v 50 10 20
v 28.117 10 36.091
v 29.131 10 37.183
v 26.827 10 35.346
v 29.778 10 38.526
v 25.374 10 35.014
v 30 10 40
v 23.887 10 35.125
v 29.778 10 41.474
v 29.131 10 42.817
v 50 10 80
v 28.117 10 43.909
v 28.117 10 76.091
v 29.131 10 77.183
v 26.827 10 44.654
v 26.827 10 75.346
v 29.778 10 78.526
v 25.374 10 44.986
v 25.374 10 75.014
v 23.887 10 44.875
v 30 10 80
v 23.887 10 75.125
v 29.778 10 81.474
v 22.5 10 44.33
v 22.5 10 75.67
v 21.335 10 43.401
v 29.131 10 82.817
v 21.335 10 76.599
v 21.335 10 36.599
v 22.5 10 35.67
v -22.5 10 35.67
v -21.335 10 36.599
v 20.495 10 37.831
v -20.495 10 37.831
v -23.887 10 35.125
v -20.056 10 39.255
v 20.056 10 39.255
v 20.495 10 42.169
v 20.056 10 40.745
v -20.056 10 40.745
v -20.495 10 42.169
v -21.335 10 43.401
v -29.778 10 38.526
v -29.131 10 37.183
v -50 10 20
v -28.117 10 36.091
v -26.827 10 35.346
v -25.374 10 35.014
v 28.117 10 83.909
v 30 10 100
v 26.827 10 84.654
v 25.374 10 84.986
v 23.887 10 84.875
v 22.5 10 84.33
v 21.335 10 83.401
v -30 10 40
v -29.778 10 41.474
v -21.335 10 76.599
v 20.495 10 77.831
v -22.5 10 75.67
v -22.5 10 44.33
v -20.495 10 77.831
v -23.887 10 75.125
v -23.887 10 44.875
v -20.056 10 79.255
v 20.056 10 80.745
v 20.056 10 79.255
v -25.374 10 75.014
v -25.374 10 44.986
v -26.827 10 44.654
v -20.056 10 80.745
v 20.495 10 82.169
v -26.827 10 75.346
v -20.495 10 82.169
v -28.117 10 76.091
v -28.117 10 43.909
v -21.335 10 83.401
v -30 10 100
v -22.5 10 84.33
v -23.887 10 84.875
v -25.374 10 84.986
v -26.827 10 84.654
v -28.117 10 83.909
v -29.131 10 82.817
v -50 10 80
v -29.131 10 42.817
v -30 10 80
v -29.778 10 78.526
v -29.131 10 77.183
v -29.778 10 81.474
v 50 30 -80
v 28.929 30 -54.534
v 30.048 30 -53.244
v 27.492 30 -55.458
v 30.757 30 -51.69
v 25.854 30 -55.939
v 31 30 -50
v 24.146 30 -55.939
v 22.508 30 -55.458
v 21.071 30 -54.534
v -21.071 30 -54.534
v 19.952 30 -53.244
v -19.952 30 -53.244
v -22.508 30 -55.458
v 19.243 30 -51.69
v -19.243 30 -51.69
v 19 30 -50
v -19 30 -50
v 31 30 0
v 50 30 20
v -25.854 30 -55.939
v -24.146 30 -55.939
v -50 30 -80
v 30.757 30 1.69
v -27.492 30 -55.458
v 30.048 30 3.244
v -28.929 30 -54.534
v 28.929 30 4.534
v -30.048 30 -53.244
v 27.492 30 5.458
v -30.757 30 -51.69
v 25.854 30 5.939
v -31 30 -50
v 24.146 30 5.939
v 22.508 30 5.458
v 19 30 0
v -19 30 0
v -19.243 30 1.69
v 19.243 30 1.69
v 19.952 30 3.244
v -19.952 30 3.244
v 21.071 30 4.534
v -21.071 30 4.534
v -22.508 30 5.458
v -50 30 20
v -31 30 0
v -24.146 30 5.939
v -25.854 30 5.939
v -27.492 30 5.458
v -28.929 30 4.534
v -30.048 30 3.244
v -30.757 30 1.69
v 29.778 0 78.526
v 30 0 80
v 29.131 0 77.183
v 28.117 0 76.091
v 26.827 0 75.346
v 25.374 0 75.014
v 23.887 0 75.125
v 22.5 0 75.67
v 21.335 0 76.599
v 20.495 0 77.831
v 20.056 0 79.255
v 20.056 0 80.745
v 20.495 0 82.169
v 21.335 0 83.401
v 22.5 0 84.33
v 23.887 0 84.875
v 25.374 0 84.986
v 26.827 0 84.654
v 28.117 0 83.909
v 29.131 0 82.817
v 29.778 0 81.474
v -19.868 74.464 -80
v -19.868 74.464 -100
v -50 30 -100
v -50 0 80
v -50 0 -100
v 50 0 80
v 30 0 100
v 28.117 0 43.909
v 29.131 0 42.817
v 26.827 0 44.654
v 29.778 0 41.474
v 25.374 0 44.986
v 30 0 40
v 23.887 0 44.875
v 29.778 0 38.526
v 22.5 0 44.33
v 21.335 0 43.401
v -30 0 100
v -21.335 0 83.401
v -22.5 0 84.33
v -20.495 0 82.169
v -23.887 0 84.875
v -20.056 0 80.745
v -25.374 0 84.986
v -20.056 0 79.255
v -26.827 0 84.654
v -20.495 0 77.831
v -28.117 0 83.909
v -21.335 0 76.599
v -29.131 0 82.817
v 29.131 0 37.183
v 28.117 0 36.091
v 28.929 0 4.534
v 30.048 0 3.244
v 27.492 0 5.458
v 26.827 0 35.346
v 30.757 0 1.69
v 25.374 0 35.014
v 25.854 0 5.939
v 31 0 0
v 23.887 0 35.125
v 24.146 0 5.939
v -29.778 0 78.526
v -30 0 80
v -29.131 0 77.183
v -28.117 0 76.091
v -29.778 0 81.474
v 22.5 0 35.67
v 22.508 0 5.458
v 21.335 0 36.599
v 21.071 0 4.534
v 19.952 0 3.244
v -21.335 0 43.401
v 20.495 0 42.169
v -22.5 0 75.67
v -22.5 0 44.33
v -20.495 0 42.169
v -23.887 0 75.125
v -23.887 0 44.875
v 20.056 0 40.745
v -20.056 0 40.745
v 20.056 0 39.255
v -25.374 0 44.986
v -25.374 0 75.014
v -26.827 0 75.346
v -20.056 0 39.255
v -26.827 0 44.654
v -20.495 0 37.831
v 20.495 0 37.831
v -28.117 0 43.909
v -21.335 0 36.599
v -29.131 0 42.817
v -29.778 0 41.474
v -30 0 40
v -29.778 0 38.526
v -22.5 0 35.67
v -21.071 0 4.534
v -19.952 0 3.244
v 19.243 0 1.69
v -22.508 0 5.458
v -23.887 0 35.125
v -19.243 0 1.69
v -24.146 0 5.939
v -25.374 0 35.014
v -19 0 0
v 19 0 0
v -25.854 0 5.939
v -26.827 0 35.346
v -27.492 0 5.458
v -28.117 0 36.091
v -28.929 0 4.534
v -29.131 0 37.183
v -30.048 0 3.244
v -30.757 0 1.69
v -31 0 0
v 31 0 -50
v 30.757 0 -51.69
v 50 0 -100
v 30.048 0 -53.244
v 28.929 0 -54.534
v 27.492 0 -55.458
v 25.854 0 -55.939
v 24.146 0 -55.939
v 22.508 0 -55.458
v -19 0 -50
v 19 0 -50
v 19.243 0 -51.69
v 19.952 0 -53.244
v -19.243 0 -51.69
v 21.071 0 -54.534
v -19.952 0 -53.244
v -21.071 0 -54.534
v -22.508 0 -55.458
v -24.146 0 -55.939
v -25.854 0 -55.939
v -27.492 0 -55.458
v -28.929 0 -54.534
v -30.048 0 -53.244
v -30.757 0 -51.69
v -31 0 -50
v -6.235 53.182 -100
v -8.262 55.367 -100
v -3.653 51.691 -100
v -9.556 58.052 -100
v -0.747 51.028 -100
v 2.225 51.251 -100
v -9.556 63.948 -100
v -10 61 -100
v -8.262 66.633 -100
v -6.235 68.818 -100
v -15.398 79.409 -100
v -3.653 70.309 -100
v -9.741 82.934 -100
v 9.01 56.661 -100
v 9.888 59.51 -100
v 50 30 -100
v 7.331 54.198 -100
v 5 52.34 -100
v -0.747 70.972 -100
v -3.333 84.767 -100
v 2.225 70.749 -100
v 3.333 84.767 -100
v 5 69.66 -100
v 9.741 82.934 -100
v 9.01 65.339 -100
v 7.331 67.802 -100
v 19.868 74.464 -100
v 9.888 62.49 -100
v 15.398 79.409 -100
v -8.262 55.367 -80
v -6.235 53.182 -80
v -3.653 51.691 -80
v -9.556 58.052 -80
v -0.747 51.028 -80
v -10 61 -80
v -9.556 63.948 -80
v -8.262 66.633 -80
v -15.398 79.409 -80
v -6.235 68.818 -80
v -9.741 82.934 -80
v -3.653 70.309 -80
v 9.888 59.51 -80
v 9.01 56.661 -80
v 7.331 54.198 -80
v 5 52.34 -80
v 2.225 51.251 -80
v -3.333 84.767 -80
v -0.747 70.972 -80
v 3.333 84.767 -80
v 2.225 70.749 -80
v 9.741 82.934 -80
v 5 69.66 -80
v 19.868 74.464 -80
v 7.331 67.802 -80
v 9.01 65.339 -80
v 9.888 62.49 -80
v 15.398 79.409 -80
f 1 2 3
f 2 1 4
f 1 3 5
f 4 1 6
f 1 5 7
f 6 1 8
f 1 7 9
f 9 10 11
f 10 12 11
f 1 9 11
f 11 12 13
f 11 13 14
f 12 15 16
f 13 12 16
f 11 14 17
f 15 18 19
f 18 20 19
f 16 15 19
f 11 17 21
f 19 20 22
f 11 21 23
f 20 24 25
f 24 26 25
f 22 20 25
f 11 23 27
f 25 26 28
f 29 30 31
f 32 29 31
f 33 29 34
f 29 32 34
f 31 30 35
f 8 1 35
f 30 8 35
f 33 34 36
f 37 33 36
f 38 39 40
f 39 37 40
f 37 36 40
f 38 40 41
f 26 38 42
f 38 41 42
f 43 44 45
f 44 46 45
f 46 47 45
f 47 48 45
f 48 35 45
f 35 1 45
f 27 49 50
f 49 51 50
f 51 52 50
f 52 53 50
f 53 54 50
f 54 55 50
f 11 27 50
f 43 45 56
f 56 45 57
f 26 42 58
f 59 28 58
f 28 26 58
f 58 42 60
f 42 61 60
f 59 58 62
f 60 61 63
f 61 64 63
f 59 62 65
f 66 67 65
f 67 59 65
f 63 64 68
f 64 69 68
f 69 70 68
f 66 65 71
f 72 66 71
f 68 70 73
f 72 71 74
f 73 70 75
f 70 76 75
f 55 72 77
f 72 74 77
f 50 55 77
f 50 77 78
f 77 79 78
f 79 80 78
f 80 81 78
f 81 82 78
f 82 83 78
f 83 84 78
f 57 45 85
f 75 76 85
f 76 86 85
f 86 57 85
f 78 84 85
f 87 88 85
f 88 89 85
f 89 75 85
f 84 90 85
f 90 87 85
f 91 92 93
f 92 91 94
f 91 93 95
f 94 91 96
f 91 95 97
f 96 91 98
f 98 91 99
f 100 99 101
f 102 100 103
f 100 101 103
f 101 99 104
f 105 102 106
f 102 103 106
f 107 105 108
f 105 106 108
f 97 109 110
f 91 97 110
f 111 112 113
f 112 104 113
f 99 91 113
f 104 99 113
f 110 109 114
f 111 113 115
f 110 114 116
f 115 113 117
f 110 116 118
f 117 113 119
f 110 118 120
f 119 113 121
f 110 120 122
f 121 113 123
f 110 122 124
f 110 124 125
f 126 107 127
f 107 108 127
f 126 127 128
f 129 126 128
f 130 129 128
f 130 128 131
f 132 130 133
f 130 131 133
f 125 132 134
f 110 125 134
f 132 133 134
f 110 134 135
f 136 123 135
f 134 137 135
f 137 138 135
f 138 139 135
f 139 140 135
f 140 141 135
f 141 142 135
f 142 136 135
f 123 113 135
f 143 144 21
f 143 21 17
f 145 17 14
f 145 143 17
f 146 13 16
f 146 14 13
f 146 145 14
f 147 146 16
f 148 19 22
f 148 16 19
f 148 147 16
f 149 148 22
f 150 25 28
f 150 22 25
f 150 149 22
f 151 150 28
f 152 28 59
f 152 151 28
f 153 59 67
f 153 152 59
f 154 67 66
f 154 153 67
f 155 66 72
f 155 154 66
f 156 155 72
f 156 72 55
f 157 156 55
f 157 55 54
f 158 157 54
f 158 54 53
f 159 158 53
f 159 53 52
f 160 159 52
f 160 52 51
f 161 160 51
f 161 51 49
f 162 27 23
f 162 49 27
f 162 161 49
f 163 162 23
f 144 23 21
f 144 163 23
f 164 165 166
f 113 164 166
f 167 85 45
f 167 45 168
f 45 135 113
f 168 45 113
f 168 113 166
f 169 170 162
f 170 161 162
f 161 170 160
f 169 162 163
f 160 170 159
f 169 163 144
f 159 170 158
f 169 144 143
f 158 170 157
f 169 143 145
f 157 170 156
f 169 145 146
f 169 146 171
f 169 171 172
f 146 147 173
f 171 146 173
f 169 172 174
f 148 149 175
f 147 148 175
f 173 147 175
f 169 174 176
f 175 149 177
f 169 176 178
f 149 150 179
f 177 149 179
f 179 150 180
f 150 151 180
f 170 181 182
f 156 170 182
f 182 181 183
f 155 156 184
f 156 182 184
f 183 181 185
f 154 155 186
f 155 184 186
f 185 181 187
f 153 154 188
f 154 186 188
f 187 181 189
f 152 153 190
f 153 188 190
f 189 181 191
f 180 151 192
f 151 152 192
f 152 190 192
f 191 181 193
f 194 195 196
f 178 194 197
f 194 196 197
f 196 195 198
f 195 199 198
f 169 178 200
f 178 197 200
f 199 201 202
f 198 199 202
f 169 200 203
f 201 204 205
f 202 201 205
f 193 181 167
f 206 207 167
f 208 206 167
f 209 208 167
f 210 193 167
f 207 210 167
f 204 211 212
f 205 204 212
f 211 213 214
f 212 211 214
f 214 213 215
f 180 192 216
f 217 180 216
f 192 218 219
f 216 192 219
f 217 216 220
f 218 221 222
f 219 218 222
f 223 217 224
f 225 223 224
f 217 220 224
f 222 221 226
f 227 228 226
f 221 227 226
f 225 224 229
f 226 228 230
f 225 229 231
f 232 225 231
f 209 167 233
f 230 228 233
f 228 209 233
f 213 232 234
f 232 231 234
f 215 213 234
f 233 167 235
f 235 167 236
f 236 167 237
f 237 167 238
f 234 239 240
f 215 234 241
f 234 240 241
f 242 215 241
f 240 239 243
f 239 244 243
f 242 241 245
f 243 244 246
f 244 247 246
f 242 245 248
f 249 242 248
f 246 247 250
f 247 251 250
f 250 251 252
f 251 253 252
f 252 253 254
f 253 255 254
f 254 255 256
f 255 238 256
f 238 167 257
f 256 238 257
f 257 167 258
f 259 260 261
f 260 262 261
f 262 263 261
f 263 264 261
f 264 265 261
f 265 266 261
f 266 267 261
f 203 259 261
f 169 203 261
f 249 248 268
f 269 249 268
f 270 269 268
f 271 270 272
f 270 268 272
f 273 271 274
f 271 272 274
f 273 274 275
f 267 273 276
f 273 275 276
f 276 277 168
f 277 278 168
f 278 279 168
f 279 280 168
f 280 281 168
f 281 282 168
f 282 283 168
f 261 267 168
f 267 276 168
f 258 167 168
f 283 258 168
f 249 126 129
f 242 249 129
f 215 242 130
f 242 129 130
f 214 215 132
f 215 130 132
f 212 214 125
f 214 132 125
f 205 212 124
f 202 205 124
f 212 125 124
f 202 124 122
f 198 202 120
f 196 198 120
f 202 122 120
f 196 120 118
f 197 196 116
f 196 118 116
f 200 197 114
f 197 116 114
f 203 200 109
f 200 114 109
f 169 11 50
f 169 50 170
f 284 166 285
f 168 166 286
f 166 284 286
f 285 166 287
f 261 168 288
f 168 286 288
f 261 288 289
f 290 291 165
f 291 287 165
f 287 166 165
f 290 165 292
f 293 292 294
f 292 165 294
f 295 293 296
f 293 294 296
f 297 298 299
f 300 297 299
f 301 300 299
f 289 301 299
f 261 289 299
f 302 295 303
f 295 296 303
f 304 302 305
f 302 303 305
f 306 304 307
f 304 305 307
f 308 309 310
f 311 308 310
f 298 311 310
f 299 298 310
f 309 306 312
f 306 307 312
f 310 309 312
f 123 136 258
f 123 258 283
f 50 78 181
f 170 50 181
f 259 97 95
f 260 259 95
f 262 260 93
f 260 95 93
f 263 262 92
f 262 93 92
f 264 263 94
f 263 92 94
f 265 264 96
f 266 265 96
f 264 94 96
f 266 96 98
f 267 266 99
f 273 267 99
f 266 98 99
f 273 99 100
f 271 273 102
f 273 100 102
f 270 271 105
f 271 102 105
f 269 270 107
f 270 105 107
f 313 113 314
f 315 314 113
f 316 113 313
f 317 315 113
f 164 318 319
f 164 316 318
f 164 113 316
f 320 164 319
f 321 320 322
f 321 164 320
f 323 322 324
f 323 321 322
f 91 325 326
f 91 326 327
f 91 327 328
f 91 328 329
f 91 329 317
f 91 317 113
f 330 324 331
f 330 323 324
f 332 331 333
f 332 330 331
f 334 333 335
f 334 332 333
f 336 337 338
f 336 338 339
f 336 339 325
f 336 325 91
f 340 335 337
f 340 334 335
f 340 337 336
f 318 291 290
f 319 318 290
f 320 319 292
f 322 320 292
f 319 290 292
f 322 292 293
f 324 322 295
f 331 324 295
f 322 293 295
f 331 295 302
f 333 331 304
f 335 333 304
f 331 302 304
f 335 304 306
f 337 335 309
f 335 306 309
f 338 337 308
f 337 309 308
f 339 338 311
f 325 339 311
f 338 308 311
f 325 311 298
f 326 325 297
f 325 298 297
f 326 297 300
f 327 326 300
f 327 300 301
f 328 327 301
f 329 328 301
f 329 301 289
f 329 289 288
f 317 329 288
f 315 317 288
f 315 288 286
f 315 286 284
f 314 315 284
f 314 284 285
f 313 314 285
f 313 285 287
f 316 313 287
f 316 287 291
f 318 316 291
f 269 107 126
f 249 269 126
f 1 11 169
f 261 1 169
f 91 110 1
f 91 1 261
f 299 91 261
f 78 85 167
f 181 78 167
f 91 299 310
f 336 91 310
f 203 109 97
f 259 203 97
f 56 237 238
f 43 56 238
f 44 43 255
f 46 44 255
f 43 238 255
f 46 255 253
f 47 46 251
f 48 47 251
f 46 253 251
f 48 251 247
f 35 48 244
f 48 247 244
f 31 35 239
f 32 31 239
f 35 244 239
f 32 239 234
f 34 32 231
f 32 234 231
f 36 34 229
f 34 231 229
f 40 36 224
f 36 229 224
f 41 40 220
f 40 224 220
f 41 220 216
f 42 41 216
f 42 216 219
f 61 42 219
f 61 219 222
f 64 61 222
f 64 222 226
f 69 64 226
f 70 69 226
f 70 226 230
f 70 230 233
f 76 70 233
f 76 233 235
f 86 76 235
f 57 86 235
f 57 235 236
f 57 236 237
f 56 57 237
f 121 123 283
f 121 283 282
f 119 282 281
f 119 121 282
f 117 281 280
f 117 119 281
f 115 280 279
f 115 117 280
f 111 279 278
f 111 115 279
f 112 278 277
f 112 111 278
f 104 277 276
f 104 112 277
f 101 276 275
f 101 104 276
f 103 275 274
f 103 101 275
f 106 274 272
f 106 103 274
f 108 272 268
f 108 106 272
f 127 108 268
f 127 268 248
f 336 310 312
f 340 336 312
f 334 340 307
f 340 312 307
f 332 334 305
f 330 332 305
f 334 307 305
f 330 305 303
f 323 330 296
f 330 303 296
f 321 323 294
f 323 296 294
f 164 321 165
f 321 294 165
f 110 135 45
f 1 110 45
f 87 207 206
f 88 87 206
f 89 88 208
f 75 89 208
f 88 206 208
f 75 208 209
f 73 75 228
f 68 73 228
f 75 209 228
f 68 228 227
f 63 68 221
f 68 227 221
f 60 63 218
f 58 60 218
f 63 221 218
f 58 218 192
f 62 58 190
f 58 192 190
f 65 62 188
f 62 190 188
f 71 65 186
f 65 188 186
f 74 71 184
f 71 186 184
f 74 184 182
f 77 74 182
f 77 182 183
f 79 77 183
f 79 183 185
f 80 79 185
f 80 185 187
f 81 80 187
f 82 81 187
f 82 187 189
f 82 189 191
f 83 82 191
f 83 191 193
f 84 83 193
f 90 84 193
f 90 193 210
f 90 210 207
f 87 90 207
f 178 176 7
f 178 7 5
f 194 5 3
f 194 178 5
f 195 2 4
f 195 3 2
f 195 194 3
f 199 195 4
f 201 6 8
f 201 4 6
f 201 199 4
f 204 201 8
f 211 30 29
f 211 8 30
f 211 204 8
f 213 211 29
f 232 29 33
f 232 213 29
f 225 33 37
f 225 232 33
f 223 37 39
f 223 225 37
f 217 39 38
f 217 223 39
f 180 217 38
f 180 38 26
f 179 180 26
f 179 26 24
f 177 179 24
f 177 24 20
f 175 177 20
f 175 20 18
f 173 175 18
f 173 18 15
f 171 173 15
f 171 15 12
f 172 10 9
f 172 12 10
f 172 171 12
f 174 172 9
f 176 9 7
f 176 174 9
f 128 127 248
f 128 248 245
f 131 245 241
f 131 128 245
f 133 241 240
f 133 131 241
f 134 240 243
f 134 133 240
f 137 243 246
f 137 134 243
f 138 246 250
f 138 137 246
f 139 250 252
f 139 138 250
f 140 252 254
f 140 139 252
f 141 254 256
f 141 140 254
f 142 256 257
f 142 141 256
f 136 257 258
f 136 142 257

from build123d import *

# Parameters (mm, degrees)
BOSS_EXTRUDE1_DEPTH      = 50
BOSS_EXTRUDE1_DEPTH_BACK = 50
CHAMFER1_SIZE            = 20
HOLE1_D                  = 10
CUT_EXTRUDE1_DEPTH       = 125.599357944
SKETCH7_W                = 100
SKETCH7_H                = 55
CUT_EXTRUDE2_DEPTH       = 206.243757518
BOSS_EXTRUDE2_DEPTH      = 20
HOLE2_D                  = 20


with BuildPart() as part:
    # Sketch1 → Boss-Extrude1 (new, two sides: drawn at the far end of the back side and taken through both)
    with BuildSketch(Plane(origin=(0, 0, 0), x_dir=(0, 0, -1), z_dir=(1, 0, 0)).offset(-BOSS_EXTRUDE1_DEPTH_BACK)):
        Polygon((-100, 0), (100, 0), (100, 85), (80, 85), (80, 30), (-20, 30), (-20, 10), (-100, 10), align=None)
    extrude(amount=BOSS_EXTRUDE1_DEPTH + BOSS_EXTRUDE1_DEPTH_BACK)

    # Chamfer1
    chamfer1_edges = [part.edges().sort_by_distance(p)[0] for p in [
        (50, 5, 100),
        (-50, 5, 100),
    ]]
    chamfer(chamfer1_edges, length=CHAMFER1_SIZE)

    # Hole1 (through all)
    with Locations(Plane(origin=(0, 10, 0), x_dir=(1, 0, 0), z_dir=(0, 1, 0))):
        with Locations((-25, -40), (-25, -80)):
            hole1 = Hole(HOLE1_D / 2)

    # Mirror1: Hole1 across plane
    add(hole1.mirror(Plane(origin=(0, 0, 0), x_dir=(0, 0, 1), z_dir=(1, 0, 0))), mode=Mode.SUBTRACT)

    # Sketch4 → Cut-Extrude1 (cut, through all)
    with BuildSketch(Plane(origin=(0, 30, 0), x_dir=(1, 0, 0), z_dir=(0, 1, 0))):
        with BuildLine():
            Line((-19, 50), (-19, 0))
            ThreePointArc((-19, 0), (-25, -6), (-31, 0))
            Line((-31, 0), (-31, 50))
            ThreePointArc((-31, 50), (-25, 56), (-19, 50))
        make_face()
        with BuildLine():
            Line((19, 50), (19, 0))
            ThreePointArc((19, 0), (25, -6), (31, 0))
            Line((31, 0), (31, 50))
            ThreePointArc((31, 50), (25, 56), (19, 50))
        make_face()
    extrude(amount=-CUT_EXTRUDE1_DEPTH, mode=Mode.SUBTRACT)

    # Sketch7 → Cut-Extrude2 (cut, through all)
    with BuildSketch(Plane.XY.offset(-80)):
        with Locations((0, 57.5)):
            Rectangle(SKETCH7_W, SKETCH7_H)
    extrude(amount=-CUT_EXTRUDE2_DEPTH, mode=Mode.SUBTRACT)

    # Sketch8 → Boss-Extrude2 (add)
    with BuildSketch(Plane(origin=(0, 0, -100), x_dir=(-1, 0, 0), z_dir=(0, 0, -1))):
        with BuildLine():
            Line((50, 30), (-50, 30))
            Line((-50, 30), (-19.867631849, 74.463922337))
            ThreePointArc((-19.867631849, 74.463922337), (0, 85), (19.867631849, 74.463922337))
            Line((19.867631849, 74.463922337), (50, 30))
        make_face()
    extrude(amount=-BOSS_EXTRUDE2_DEPTH)

    # Hole2 (through all)
    with Locations(Plane.XY.offset(-80)):
        with Locations((0, 61)):
            Hole(HOLE2_D / 2)


solid = part.part
